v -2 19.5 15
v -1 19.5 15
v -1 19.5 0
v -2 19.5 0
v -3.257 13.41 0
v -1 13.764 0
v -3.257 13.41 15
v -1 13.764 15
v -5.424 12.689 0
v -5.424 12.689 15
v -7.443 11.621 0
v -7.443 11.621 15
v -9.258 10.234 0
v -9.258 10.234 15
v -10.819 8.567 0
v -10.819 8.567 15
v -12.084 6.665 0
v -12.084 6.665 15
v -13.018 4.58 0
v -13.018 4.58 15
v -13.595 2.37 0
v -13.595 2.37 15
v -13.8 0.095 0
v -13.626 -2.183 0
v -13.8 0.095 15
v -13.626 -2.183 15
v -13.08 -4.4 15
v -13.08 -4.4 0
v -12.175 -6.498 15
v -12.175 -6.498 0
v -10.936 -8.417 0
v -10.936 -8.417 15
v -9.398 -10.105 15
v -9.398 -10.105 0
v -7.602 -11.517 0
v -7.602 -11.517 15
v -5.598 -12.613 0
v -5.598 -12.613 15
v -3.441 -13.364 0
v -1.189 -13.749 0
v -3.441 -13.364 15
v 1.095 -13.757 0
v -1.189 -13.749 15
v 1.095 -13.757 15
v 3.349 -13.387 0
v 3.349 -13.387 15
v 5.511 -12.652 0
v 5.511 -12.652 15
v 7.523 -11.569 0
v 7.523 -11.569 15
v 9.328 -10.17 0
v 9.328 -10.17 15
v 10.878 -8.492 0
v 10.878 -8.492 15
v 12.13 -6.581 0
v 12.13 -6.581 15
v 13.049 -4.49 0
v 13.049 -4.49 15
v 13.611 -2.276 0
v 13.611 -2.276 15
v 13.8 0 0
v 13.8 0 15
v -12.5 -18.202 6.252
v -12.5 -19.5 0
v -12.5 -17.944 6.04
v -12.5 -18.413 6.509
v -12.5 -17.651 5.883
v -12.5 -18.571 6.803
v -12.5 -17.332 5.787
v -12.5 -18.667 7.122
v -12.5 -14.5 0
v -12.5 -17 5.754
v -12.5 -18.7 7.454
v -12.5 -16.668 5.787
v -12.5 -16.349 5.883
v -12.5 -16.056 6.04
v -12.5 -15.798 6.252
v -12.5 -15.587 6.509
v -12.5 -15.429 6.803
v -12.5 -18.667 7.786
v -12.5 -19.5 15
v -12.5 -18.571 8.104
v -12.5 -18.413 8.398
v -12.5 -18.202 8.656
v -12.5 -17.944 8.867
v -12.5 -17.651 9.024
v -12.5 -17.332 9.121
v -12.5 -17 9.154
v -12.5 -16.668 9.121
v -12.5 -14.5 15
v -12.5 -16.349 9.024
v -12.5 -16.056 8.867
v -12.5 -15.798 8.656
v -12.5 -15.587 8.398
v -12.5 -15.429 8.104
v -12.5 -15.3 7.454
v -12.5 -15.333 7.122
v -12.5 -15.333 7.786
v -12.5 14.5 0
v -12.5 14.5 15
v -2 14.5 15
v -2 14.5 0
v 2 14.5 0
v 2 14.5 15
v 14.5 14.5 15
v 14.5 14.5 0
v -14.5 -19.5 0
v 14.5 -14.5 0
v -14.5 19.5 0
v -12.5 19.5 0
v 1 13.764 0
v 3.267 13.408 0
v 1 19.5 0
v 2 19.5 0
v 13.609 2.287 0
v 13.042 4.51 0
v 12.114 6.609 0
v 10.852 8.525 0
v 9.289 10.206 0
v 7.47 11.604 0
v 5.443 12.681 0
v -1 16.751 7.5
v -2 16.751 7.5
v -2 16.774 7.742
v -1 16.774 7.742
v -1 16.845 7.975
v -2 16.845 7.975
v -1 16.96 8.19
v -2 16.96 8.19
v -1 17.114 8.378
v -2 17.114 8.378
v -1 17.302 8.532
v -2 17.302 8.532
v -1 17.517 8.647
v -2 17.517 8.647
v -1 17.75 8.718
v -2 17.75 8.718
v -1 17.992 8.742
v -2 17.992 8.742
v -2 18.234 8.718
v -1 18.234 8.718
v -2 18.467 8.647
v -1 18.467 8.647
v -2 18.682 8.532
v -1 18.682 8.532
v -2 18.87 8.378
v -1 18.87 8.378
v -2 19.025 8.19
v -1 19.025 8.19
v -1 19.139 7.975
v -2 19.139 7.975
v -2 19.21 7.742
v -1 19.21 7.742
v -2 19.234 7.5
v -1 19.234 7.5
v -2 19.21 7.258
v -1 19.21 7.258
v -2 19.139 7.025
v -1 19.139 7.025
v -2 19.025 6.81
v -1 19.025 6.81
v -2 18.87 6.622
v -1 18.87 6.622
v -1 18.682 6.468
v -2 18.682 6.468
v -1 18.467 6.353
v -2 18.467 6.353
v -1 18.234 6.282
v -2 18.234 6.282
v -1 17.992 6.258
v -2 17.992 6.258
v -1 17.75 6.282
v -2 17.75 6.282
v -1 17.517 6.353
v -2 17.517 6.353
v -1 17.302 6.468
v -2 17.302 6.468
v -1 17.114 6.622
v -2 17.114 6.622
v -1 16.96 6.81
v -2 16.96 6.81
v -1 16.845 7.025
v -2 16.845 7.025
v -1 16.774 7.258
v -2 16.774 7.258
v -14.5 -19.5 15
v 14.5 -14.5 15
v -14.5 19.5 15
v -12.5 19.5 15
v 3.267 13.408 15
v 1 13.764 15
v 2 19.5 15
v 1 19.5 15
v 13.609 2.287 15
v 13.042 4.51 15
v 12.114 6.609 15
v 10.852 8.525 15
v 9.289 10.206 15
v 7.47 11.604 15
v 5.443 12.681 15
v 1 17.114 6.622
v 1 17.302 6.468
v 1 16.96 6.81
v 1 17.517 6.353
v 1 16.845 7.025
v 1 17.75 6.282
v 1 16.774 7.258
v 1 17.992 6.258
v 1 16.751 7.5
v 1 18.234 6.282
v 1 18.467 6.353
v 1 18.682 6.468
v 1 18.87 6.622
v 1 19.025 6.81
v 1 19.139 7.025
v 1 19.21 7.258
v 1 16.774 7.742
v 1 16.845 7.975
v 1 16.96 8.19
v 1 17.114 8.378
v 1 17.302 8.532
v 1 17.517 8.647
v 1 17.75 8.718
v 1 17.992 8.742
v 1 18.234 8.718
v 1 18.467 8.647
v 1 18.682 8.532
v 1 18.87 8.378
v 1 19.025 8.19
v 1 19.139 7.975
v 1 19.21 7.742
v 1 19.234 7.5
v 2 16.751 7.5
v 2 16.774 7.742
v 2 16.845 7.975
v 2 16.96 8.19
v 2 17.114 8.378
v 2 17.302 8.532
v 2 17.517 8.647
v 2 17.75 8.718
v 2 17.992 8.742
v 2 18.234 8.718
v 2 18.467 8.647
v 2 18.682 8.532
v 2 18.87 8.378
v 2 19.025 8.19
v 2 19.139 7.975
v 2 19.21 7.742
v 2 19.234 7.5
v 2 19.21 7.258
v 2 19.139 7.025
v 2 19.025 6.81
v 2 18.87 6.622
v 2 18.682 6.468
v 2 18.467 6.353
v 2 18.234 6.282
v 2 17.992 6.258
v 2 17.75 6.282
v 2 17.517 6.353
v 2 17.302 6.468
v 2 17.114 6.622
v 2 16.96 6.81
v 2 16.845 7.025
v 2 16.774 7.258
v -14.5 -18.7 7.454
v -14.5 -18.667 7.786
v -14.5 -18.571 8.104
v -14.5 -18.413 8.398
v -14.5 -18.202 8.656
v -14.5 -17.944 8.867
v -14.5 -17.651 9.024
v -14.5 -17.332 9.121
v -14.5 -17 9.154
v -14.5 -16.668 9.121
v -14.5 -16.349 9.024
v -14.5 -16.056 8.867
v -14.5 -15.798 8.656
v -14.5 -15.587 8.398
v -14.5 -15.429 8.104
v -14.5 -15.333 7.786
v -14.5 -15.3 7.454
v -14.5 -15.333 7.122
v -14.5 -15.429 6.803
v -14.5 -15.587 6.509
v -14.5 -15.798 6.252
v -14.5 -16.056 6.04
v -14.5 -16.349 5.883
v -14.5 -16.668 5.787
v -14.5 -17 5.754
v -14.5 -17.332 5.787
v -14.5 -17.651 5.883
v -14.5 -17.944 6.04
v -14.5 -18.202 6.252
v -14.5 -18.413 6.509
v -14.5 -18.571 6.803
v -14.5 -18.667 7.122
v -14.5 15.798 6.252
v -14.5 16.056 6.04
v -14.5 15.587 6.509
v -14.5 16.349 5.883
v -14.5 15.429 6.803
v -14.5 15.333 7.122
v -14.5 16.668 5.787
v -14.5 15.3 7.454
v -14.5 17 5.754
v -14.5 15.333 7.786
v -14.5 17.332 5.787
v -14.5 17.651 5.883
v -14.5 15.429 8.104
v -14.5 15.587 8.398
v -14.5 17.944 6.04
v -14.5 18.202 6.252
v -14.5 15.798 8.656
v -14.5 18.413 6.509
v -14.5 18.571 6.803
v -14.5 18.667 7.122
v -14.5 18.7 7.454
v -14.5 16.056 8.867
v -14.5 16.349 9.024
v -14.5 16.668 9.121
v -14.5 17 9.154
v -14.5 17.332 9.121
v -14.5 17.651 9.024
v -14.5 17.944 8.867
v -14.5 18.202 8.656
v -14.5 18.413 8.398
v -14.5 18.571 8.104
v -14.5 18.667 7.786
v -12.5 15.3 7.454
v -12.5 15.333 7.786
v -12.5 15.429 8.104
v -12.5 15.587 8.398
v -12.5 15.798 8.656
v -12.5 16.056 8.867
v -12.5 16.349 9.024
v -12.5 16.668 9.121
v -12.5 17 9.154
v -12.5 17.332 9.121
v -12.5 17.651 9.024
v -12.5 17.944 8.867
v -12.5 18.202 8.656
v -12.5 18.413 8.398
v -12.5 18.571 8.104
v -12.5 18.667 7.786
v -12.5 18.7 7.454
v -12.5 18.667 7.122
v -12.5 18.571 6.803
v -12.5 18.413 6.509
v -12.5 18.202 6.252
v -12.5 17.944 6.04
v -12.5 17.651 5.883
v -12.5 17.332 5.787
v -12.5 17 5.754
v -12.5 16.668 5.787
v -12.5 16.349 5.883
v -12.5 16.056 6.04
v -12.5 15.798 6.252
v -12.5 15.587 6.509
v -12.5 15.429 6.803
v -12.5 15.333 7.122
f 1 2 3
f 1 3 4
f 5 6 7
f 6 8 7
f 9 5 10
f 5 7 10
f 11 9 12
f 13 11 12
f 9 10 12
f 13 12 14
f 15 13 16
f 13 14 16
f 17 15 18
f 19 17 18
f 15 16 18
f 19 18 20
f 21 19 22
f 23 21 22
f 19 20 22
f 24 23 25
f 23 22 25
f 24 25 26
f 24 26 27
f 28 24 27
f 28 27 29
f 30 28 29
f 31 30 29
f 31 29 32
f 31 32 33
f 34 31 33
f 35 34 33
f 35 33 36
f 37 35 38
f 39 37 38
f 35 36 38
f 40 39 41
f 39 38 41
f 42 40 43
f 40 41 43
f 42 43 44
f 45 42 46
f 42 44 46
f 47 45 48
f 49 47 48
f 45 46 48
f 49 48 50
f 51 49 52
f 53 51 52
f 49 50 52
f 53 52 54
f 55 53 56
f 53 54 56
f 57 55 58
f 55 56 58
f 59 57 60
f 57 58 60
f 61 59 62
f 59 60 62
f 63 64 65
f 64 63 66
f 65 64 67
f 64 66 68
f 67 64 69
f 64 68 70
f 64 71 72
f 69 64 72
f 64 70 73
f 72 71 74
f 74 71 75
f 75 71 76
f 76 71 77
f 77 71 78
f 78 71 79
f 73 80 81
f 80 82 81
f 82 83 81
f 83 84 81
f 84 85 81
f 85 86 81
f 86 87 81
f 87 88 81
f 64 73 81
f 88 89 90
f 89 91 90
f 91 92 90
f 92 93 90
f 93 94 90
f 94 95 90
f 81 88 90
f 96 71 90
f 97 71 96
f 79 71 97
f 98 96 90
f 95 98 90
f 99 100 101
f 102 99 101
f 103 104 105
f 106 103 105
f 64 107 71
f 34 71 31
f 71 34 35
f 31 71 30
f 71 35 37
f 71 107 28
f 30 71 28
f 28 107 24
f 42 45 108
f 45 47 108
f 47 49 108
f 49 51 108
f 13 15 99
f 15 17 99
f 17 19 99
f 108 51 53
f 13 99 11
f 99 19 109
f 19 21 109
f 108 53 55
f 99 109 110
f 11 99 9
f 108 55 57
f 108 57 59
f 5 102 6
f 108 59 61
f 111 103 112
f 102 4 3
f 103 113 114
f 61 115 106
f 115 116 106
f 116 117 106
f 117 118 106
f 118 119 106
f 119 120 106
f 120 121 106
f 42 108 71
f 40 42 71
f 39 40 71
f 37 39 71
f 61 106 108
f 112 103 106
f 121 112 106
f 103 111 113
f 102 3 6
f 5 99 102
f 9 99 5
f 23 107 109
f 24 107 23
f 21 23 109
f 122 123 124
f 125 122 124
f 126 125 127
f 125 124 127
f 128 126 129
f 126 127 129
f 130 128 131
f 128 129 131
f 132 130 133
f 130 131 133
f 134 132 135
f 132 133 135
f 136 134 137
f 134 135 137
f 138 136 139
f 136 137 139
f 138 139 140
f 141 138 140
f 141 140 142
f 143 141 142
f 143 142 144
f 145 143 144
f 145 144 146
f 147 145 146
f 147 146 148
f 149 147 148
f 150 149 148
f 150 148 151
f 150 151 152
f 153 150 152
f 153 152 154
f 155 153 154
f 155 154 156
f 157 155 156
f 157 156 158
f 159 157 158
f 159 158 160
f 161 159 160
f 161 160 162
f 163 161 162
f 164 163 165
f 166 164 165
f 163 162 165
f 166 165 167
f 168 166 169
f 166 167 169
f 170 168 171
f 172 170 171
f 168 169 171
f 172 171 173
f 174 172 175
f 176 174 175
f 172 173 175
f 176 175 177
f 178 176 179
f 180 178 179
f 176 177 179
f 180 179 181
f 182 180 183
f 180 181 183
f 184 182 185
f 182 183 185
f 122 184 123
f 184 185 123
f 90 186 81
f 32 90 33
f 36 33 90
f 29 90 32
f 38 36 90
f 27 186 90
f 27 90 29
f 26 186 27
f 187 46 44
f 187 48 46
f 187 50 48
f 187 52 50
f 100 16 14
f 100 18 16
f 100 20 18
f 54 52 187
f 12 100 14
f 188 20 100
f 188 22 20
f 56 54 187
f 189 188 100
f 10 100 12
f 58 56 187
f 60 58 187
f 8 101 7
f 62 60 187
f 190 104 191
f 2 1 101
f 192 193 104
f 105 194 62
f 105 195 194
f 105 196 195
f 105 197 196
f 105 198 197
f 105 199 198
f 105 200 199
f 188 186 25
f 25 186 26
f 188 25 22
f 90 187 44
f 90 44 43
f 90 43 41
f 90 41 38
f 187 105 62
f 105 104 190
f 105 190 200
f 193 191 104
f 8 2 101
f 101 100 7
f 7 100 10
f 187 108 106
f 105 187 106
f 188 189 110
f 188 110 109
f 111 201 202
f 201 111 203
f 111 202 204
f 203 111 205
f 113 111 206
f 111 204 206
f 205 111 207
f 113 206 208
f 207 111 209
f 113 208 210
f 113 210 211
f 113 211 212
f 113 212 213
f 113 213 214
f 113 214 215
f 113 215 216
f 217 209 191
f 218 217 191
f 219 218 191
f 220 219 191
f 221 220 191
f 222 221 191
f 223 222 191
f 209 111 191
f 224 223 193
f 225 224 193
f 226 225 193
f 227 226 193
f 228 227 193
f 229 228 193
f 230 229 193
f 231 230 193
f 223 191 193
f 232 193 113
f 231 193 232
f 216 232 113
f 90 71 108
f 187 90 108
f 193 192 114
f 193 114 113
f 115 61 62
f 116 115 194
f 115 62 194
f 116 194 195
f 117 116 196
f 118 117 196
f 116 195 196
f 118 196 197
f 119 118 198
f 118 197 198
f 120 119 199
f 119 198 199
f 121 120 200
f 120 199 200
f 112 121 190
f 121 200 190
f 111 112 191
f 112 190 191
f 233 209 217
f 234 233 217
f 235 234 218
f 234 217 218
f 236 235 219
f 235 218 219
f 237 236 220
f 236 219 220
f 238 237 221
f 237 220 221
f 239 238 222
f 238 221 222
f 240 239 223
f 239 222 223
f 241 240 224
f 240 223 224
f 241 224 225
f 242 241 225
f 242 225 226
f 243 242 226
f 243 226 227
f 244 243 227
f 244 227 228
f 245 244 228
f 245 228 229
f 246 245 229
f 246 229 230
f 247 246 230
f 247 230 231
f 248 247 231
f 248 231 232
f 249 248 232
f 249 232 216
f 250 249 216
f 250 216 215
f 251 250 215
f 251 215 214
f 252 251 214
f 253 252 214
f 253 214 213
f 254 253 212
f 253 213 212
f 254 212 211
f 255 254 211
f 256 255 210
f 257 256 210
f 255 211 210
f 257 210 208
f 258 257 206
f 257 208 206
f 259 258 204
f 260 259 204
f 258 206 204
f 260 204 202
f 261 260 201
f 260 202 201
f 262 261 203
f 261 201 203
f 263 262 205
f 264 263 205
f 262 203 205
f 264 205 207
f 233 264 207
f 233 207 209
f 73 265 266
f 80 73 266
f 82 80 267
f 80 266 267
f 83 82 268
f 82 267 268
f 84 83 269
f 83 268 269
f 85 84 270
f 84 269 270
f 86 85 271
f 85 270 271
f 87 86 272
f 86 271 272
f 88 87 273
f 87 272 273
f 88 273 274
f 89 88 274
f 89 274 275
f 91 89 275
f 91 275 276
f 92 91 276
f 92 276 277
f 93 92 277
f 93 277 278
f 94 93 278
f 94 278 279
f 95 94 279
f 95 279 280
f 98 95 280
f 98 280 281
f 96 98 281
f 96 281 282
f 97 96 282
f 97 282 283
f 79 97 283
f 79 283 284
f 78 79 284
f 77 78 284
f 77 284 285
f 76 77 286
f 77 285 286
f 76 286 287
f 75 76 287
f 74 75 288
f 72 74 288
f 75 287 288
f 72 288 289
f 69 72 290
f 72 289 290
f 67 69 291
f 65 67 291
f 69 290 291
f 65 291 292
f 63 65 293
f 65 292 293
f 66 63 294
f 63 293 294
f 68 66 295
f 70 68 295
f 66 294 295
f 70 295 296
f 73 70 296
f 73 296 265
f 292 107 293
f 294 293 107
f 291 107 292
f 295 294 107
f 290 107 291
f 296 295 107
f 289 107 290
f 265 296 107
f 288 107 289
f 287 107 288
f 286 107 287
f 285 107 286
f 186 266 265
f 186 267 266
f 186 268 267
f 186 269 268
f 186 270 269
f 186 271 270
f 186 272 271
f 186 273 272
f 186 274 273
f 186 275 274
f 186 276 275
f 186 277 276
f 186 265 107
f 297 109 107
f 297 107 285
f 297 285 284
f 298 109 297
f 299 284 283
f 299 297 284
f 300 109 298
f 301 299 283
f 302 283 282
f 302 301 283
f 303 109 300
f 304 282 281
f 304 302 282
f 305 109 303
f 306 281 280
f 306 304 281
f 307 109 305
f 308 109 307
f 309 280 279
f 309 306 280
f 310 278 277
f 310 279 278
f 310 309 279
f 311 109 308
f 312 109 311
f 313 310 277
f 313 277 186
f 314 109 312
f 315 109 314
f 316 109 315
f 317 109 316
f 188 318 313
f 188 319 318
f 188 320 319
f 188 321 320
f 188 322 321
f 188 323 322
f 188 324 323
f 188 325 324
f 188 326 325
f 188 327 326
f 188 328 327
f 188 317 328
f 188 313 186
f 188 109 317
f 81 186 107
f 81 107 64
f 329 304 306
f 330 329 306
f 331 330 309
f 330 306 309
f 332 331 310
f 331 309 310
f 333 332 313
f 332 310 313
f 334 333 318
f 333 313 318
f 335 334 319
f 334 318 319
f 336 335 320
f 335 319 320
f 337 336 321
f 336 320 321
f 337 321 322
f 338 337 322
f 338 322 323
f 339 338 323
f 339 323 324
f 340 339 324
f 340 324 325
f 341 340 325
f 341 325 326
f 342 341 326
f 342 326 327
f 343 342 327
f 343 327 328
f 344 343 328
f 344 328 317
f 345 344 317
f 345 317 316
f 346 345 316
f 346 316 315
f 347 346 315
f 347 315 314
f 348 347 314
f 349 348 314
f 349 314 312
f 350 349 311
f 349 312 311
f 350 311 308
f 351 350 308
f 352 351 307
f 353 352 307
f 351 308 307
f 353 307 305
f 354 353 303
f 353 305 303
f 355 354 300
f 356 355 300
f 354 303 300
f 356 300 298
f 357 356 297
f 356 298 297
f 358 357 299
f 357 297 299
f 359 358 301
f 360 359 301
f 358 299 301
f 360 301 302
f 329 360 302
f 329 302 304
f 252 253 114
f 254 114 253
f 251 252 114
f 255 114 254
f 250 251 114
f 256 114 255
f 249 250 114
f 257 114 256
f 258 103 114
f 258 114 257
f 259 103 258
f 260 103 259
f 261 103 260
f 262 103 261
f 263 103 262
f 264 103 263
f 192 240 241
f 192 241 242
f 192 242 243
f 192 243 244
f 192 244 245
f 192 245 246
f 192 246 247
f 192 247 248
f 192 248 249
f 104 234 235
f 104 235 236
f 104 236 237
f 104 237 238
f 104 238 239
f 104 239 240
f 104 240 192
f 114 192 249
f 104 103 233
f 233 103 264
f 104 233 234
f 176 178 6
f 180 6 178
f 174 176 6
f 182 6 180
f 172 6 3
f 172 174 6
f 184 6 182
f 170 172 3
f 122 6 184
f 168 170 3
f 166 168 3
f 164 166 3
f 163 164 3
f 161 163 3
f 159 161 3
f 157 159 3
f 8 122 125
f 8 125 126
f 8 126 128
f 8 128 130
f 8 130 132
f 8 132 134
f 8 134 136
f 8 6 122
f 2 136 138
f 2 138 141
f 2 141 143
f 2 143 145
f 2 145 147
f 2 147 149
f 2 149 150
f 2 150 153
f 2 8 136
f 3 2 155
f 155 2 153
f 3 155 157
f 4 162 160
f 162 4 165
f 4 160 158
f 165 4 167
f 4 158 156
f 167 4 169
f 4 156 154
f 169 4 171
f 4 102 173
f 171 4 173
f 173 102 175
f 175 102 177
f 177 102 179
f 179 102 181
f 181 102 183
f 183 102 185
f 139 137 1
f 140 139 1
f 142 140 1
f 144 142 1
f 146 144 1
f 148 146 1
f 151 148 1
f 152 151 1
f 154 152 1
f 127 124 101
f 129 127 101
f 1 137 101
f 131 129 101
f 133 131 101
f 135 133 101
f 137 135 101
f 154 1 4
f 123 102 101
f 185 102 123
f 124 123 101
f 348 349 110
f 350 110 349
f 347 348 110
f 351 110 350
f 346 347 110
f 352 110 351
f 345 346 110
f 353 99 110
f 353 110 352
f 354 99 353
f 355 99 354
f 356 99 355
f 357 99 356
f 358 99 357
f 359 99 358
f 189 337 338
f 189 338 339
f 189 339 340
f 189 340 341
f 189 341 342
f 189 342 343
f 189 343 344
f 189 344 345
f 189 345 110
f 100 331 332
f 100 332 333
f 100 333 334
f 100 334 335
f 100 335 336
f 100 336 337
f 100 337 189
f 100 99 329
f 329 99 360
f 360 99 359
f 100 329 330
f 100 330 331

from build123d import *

# Parameters (mm, degrees)
SKETCH_W        = 29
SKETCH_H        = 29
PAD_DEPTH       = 15
SKETCH001_R     = 13.8
POCKET_DEPTH    = 15
SKETCH003_W     = 4
SKETCH003_H     = 15
PAD001_DEPTH    = 5
SKETCH005_W     = 2
SKETCH005_H     = 9.016475
POCKET001_DEPTH = 15
SKETCH006_R     = 1.241628
POCKET002_DEPTH = 5
SKETCH007_W     = 2
SKETCH007_H     = 15
PAD002_DEPTH    = 5
SKETCH008_W     = 2
SKETCH008_H     = 15
PAD003_DEPTH    = 5
SKETCH009_R     = 1.7
POCKET003_DEPTH = 5


with BuildPart() as part:
    # Sketch → Pad (new body)
    with BuildSketch(Plane.XY):
        Rectangle(SKETCH_W, SKETCH_H)
    extrude(amount=PAD_DEPTH)

    # Sketch001 (on Face6 of Pad) → Pocket (cut)
    with BuildSketch(Plane.XY.offset(15)):
        Circle(SKETCH001_R)
    extrude(amount=-POCKET_DEPTH, mode=Mode.SUBTRACT)

    # Sketch003 (on Face1 of Pocket) → Pad001 (join)
    with BuildSketch(Plane(origin=(0, 14.5, 0), x_dir=(-1, 0, 0), z_dir=(0, 1, 0))):
        with Locations((0, 7.5)):
            Rectangle(SKETCH003_W, SKETCH003_H)
    extrude(amount=PAD001_DEPTH)

    # Sketch005 (on Face11 of Pad001) → Pocket001 (cut)
    with BuildSketch(Plane.XY.offset(15)):
        with Locations((0, 17.054208)):
            Rectangle(SKETCH005_W, SKETCH005_H)
    extrude(amount=-POCKET001_DEPTH, mode=Mode.SUBTRACT)

    # Sketch006 (on Face3 of Pocket001) → Pocket002 (cut)
    with BuildSketch(Plane(origin=(-2, 0, 0), x_dir=(0, -1, 0), z_dir=(-1, 0, 0))):
        with Locations((-17.992161, 7.5)):
            Circle(SKETCH006_R)
    extrude(amount=-POCKET002_DEPTH, mode=Mode.SUBTRACT)

    # Sketch007 (on Face1 of Pocket002) → Pad002 (join)
    with BuildSketch(Plane(origin=(0, 14.5, 0), x_dir=(-1, 0, 0), z_dir=(0, 1, 0))):
        with Locations((13.5, 7.5)):
            Rectangle(SKETCH007_W, SKETCH007_H)
    extrude(amount=PAD002_DEPTH)

    # Sketch008 (on Face7 of Pad002) → Pad003 (join)
    with BuildSketch(Plane.XZ.offset(14.5)):
        with Locations((-13.5, 7.5)):
            Rectangle(SKETCH008_W, SKETCH008_H)
    extrude(amount=PAD003_DEPTH)

    # Sketch009 (on Face26 of Pad003) → Pocket003 (cut)
    with BuildSketch(Plane(origin=(-14.5, 0, 0), x_dir=(0, -1, 0), z_dir=(-1, 0, 0))):
        with Locations((-17, 7.453879)):
            Circle(SKETCH009_R)
        with Locations((17, 7.453879)):
            Circle(SKETCH009_R)
    extrude(amount=-POCKET003_DEPTH, mode=Mode.SUBTRACT)


solid = part.part
